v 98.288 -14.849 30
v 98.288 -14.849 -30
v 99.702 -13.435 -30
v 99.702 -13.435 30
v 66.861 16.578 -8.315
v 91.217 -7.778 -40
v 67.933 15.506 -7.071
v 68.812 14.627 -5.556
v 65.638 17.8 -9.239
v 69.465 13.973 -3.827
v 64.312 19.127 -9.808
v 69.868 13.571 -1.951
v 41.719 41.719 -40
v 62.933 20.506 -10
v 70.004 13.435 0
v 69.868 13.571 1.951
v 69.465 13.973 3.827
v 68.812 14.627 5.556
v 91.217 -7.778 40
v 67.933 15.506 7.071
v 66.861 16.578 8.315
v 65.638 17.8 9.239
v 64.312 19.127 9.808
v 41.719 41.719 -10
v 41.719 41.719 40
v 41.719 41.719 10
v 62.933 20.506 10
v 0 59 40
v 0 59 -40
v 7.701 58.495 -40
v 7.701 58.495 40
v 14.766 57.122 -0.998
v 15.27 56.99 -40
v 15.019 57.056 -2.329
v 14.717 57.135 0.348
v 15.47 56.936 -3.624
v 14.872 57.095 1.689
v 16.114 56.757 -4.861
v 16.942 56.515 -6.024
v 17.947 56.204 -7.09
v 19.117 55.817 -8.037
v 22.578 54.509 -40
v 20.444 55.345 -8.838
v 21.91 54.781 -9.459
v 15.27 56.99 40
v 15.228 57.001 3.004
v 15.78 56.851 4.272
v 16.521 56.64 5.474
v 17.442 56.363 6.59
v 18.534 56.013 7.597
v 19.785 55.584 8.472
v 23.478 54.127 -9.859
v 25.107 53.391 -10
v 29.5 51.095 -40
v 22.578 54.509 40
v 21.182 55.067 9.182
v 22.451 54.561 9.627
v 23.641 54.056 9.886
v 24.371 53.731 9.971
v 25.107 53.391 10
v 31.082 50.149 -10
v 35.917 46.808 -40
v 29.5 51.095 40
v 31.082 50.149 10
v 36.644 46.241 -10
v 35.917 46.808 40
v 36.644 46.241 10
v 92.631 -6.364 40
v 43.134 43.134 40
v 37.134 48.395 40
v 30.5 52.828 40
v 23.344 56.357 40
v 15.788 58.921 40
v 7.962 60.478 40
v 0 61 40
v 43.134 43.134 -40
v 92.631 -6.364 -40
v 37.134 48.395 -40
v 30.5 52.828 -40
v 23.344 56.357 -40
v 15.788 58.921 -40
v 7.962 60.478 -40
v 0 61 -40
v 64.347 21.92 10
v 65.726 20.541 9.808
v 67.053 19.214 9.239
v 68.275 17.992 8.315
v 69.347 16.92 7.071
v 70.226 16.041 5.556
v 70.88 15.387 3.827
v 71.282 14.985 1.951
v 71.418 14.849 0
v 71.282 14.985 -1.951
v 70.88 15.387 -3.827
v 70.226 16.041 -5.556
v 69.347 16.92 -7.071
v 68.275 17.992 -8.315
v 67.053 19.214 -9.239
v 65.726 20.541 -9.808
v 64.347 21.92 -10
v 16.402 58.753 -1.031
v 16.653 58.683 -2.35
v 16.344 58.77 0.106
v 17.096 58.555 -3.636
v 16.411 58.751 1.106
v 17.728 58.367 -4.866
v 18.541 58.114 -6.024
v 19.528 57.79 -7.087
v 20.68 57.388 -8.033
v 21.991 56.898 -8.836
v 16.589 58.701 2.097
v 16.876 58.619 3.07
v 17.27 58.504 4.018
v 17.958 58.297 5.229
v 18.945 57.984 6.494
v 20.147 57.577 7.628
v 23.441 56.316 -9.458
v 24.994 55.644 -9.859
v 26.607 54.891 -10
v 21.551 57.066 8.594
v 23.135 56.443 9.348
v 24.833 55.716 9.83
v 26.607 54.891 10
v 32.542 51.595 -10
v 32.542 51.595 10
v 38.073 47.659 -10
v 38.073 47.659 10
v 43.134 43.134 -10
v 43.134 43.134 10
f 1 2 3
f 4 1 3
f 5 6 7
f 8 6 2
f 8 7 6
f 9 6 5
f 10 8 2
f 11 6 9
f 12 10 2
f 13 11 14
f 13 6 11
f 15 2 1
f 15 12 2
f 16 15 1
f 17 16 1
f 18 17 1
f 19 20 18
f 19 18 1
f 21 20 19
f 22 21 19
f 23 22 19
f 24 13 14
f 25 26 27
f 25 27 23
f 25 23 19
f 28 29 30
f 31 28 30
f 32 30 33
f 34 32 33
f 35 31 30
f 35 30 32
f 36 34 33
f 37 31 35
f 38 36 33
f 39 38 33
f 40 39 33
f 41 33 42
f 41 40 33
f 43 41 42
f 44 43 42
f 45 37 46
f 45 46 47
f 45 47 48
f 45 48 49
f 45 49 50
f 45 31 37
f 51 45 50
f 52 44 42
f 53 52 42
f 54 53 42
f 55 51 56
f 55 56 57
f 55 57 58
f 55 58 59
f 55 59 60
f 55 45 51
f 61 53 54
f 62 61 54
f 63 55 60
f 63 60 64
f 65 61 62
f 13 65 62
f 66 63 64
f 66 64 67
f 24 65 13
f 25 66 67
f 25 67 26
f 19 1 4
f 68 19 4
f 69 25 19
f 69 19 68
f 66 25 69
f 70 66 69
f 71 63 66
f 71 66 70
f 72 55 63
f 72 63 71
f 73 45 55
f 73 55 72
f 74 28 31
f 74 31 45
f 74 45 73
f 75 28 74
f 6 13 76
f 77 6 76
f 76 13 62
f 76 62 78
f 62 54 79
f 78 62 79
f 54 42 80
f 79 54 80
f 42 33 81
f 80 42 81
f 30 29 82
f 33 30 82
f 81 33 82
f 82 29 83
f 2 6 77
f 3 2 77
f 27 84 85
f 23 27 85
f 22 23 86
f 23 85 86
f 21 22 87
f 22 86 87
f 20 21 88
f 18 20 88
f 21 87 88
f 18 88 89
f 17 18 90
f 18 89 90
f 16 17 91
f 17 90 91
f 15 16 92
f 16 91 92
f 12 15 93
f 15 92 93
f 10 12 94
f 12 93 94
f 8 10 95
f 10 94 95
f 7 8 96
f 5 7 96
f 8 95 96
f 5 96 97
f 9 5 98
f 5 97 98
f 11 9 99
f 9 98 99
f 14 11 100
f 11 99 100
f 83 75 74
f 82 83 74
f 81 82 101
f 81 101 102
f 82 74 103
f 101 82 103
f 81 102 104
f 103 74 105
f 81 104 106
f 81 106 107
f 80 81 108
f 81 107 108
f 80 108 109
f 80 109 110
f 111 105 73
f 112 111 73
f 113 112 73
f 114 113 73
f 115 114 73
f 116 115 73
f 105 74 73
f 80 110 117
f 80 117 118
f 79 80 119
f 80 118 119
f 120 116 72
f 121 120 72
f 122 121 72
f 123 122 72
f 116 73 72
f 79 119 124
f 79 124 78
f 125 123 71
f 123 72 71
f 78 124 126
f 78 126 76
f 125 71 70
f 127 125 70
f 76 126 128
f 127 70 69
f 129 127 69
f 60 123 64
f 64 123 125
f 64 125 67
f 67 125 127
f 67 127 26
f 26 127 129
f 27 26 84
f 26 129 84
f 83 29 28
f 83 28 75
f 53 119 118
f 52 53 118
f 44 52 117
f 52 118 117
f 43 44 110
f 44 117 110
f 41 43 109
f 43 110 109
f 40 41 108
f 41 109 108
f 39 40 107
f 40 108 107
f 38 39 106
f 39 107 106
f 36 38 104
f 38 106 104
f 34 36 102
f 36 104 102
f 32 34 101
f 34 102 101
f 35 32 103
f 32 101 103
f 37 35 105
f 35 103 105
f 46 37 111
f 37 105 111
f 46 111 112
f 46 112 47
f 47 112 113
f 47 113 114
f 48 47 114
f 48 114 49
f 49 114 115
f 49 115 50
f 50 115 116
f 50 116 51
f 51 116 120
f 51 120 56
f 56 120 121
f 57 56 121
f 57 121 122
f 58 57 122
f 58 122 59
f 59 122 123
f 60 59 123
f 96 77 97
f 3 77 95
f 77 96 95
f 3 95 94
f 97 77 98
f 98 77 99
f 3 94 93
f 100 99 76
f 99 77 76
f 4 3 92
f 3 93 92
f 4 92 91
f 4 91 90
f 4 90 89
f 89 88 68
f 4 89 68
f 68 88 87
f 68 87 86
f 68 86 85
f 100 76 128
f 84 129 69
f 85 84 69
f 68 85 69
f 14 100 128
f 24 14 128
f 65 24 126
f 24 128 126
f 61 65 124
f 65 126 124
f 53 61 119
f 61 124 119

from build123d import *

# Parameters (mm, degrees)
F0_W     = 2
F0_H     = 80
F1_ANGLE = 45
F2_DEPTH = 80
F4_DEPTH = 71.501
F5_SIZE  = 10


with BuildPart() as f1:
    # F0 (on Right) → F1 (revolve)
    with BuildSketch(Plane.YZ):
        with Locations((60, 0)):
            Rectangle(F0_W, F0_H)
    revolve(axis=Axis((0, 0, 0), (0, 0, -1)), revolution_arc=F1_ANGLE)

    # F2 (add): a face of the model
    f2_faces = [f1.faces().sort_by_distance(p)[0] for p in [
        (42.4264068712, 42.4264068712, 0),
    ]]
    extrude(f2_faces, amount=F2_DEPTH)

    # F3 (on face) → F4 (cut, through all)
    with BuildSketch(Plane(origin=(43.1335136524, 43.1335136524, 0), x_dir=(-0.7071067812, 0.7071067812, 0), z_dir=(0.7071067812, 0.7071067812, 0))):
        with BuildLine():
            ThreePointArc((20, -10), (30, 0), (20, 10))
            Line((20, 10), (-30, 10))
            ThreePointArc((-30, 10), (-40, 0), (-30, -10))
            Line((-30, -10), (20, -10))
        make_face()
    extrude(amount=-F4_DEPTH, mode=Mode.SUBTRACT)

    # F5
    f5_edges = [f1.edges().sort_by_distance(p)[0] for p in [
        (98.994949, -14.142136, 40),
        (98.994949, -14.142136, -40),
    ]]
    chamfer(f5_edges, length=F5_SIZE)


solid = f1.part
